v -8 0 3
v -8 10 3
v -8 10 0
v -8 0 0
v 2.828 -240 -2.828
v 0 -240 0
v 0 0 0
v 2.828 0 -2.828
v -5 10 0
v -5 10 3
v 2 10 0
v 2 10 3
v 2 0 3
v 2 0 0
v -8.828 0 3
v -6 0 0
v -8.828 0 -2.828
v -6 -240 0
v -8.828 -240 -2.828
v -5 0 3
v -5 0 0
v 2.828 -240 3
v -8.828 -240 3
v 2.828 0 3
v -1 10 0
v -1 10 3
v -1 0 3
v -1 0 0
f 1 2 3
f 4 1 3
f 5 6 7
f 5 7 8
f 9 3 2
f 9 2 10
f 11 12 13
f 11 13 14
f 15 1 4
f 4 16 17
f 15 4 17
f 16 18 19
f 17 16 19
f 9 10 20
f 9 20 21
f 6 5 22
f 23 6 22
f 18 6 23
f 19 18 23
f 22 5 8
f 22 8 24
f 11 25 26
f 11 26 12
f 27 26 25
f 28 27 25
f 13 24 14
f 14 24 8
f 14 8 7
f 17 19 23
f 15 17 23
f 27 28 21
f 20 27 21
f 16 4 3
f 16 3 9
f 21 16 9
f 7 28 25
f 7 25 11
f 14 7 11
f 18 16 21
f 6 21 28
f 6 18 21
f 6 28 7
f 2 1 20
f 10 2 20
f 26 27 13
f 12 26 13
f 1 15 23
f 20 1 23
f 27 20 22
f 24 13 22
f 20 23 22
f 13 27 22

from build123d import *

# Parameters (mm, degrees)
SKETCH2_W           = 6
SKETCH2_H           = 240
BOSS_EXTRUDE1_DEPTH = 3
BOSS_EXTRUDE2_DEPTH = 240
SKETCH5_W           = 3
SKETCH5_H           = 3
BOSS_EXTRUDE3_DEPTH = 10


with BuildPart() as part:
    # Sketch2 → Boss-Extrude1 (new body)
    with BuildSketch(Plane.XY):
        with Locations((-3, -120)):
            Rectangle(SKETCH2_W, SKETCH2_H)
    extrude(amount=BOSS_EXTRUDE1_DEPTH)

    # Sketch4 → Boss-Extrude2 (add)
    with BuildSketch(Plane(origin=(0, -240, 0), x_dir=(-1, 0, 0), z_dir=(0, -1, 0))):
        Polygon((0, 0), (-2.828427125, 2.828427125), (-2.828427125, -3), (0, -3), align=None)
        Polygon((8.828427125, -3), (6, -3), (6, 0), (8.828427125, 2.828427125), align=None)
    extrude(amount=-BOSS_EXTRUDE2_DEPTH)

    # Sketch5 → Boss-Extrude3 (add)
    with BuildSketch(Plane(origin=(0, 0, 0), x_dir=(1, 0, 0), z_dir=(0, 1, 0))):
        with Locations((-6.5, -1.5)):
            Rectangle(SKETCH5_W, SKETCH5_H)
        with Locations((0.5, -1.5)):
            Rectangle(SKETCH5_W, SKETCH5_H)
    extrude(amount=BOSS_EXTRUDE3_DEPTH)


solid = part.part
